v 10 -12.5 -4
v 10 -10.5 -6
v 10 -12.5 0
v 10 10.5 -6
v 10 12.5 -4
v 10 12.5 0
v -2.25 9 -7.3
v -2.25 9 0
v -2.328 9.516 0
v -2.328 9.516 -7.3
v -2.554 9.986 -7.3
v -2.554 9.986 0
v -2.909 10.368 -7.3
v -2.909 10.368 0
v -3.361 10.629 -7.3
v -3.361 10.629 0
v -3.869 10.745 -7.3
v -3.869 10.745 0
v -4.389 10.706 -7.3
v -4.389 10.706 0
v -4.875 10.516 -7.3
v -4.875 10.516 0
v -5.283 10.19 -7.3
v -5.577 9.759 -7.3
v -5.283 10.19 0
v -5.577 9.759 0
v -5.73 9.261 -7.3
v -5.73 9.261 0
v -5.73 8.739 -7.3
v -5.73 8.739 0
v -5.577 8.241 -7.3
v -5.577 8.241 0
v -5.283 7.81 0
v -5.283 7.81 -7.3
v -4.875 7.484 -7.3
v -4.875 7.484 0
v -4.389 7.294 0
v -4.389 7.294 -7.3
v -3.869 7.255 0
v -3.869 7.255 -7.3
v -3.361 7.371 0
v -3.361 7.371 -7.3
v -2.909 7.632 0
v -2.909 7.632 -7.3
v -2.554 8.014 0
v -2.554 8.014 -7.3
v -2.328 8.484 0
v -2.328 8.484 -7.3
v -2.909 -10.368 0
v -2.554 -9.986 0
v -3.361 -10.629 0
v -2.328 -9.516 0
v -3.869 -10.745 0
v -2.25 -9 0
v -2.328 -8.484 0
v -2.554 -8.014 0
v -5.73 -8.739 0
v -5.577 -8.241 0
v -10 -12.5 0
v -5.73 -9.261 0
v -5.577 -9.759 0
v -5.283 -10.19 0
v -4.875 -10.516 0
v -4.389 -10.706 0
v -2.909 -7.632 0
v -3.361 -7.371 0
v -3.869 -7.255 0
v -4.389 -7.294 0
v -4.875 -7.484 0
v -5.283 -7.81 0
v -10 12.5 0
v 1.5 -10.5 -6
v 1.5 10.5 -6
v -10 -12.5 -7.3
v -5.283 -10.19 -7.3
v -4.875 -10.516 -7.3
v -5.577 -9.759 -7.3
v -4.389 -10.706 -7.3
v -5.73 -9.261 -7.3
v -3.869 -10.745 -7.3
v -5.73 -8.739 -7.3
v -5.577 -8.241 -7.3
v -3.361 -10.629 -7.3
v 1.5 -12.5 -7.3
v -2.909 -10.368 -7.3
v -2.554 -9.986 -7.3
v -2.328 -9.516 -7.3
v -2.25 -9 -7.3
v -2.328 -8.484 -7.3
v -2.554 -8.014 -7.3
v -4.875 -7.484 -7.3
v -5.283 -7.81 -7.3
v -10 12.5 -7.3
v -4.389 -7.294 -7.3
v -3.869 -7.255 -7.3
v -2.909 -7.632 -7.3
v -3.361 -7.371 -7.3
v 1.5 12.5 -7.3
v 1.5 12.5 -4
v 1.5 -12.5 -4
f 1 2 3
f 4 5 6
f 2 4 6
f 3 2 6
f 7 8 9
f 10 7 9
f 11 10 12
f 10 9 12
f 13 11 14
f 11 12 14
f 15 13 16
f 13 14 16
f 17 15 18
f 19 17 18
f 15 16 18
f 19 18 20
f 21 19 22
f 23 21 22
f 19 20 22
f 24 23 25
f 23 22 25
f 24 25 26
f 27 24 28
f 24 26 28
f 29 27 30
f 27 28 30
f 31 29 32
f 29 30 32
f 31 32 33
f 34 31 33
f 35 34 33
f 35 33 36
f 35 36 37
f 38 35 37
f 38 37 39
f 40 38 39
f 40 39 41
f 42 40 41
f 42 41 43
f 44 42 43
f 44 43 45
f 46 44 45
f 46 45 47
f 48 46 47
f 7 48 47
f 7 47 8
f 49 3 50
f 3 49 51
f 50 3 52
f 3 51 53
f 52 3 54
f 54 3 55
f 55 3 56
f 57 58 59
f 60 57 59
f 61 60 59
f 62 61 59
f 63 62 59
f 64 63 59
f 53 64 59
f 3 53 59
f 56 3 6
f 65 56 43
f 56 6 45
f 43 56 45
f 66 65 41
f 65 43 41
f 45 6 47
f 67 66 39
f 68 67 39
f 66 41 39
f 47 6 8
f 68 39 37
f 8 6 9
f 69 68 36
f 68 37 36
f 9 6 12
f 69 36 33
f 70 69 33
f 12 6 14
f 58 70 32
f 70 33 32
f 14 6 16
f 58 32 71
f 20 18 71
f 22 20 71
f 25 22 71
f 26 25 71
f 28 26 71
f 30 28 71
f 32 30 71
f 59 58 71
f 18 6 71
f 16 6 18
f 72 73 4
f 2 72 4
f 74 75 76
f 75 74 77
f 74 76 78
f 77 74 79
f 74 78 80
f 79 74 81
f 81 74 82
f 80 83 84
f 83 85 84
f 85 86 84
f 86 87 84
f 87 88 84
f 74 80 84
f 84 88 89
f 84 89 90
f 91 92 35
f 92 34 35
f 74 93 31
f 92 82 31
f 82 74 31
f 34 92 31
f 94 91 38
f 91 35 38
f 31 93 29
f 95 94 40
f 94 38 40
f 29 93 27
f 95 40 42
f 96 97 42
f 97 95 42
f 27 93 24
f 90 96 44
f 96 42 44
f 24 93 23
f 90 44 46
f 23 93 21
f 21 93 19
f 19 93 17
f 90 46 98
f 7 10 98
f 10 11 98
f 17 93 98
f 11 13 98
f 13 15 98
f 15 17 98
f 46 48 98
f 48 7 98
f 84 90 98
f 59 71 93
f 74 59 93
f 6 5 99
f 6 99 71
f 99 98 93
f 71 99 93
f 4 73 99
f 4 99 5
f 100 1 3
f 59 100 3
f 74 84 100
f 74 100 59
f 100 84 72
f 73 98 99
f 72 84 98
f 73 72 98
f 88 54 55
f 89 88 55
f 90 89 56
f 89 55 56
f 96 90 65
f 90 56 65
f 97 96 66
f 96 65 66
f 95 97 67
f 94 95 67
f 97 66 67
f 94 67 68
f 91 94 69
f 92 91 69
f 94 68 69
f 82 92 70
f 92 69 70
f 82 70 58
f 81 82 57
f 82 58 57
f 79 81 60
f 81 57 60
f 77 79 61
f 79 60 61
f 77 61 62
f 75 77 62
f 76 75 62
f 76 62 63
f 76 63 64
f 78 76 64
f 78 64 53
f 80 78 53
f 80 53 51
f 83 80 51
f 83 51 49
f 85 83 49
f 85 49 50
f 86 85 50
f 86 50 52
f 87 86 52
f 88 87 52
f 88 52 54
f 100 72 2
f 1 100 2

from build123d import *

# Parameters (mm, degrees)
BOSS_EXTRUDE1_DEPTH = 12.5
SKETCH2_R           = 1.75
CUT_EXTRUDE1_DEPTH  = 18.59374889
CHAMFER1_SIZE       = 2


with BuildPart() as part:
    # Sketch1 → Boss-Extrude1 (new, symmetric)
    with BuildSketch(Plane(origin=(0, 0, 0), x_dir=(1, 0, 0), z_dir=(0, 1, 0))):
        Polygon((-10, 7.3), (1.5, 7.3), (1.5, 6), (10, 6), (10, 0), (-10, 0), align=None)
    extrude(amount=BOSS_EXTRUDE1_DEPTH, both=True)

    # Sketch2 → Cut-Extrude1 (cut, through all)
    with BuildSketch(Plane.XY):
        with Locations((-4, 9)):
            Circle(SKETCH2_R)
        with Locations((-4, -9)):
            Circle(SKETCH2_R)
    extrude(amount=-CUT_EXTRUDE1_DEPTH, mode=Mode.SUBTRACT)

    # Chamfer1
    chamfer1_edges = [part.edges().sort_by_distance(p)[0] for p in [
        (5.75, 12.5, -6),
        (5.75, -12.5, -6),
    ]]
    chamfer(chamfer1_edges, length=CHAMFER1_SIZE)


solid = part.part
